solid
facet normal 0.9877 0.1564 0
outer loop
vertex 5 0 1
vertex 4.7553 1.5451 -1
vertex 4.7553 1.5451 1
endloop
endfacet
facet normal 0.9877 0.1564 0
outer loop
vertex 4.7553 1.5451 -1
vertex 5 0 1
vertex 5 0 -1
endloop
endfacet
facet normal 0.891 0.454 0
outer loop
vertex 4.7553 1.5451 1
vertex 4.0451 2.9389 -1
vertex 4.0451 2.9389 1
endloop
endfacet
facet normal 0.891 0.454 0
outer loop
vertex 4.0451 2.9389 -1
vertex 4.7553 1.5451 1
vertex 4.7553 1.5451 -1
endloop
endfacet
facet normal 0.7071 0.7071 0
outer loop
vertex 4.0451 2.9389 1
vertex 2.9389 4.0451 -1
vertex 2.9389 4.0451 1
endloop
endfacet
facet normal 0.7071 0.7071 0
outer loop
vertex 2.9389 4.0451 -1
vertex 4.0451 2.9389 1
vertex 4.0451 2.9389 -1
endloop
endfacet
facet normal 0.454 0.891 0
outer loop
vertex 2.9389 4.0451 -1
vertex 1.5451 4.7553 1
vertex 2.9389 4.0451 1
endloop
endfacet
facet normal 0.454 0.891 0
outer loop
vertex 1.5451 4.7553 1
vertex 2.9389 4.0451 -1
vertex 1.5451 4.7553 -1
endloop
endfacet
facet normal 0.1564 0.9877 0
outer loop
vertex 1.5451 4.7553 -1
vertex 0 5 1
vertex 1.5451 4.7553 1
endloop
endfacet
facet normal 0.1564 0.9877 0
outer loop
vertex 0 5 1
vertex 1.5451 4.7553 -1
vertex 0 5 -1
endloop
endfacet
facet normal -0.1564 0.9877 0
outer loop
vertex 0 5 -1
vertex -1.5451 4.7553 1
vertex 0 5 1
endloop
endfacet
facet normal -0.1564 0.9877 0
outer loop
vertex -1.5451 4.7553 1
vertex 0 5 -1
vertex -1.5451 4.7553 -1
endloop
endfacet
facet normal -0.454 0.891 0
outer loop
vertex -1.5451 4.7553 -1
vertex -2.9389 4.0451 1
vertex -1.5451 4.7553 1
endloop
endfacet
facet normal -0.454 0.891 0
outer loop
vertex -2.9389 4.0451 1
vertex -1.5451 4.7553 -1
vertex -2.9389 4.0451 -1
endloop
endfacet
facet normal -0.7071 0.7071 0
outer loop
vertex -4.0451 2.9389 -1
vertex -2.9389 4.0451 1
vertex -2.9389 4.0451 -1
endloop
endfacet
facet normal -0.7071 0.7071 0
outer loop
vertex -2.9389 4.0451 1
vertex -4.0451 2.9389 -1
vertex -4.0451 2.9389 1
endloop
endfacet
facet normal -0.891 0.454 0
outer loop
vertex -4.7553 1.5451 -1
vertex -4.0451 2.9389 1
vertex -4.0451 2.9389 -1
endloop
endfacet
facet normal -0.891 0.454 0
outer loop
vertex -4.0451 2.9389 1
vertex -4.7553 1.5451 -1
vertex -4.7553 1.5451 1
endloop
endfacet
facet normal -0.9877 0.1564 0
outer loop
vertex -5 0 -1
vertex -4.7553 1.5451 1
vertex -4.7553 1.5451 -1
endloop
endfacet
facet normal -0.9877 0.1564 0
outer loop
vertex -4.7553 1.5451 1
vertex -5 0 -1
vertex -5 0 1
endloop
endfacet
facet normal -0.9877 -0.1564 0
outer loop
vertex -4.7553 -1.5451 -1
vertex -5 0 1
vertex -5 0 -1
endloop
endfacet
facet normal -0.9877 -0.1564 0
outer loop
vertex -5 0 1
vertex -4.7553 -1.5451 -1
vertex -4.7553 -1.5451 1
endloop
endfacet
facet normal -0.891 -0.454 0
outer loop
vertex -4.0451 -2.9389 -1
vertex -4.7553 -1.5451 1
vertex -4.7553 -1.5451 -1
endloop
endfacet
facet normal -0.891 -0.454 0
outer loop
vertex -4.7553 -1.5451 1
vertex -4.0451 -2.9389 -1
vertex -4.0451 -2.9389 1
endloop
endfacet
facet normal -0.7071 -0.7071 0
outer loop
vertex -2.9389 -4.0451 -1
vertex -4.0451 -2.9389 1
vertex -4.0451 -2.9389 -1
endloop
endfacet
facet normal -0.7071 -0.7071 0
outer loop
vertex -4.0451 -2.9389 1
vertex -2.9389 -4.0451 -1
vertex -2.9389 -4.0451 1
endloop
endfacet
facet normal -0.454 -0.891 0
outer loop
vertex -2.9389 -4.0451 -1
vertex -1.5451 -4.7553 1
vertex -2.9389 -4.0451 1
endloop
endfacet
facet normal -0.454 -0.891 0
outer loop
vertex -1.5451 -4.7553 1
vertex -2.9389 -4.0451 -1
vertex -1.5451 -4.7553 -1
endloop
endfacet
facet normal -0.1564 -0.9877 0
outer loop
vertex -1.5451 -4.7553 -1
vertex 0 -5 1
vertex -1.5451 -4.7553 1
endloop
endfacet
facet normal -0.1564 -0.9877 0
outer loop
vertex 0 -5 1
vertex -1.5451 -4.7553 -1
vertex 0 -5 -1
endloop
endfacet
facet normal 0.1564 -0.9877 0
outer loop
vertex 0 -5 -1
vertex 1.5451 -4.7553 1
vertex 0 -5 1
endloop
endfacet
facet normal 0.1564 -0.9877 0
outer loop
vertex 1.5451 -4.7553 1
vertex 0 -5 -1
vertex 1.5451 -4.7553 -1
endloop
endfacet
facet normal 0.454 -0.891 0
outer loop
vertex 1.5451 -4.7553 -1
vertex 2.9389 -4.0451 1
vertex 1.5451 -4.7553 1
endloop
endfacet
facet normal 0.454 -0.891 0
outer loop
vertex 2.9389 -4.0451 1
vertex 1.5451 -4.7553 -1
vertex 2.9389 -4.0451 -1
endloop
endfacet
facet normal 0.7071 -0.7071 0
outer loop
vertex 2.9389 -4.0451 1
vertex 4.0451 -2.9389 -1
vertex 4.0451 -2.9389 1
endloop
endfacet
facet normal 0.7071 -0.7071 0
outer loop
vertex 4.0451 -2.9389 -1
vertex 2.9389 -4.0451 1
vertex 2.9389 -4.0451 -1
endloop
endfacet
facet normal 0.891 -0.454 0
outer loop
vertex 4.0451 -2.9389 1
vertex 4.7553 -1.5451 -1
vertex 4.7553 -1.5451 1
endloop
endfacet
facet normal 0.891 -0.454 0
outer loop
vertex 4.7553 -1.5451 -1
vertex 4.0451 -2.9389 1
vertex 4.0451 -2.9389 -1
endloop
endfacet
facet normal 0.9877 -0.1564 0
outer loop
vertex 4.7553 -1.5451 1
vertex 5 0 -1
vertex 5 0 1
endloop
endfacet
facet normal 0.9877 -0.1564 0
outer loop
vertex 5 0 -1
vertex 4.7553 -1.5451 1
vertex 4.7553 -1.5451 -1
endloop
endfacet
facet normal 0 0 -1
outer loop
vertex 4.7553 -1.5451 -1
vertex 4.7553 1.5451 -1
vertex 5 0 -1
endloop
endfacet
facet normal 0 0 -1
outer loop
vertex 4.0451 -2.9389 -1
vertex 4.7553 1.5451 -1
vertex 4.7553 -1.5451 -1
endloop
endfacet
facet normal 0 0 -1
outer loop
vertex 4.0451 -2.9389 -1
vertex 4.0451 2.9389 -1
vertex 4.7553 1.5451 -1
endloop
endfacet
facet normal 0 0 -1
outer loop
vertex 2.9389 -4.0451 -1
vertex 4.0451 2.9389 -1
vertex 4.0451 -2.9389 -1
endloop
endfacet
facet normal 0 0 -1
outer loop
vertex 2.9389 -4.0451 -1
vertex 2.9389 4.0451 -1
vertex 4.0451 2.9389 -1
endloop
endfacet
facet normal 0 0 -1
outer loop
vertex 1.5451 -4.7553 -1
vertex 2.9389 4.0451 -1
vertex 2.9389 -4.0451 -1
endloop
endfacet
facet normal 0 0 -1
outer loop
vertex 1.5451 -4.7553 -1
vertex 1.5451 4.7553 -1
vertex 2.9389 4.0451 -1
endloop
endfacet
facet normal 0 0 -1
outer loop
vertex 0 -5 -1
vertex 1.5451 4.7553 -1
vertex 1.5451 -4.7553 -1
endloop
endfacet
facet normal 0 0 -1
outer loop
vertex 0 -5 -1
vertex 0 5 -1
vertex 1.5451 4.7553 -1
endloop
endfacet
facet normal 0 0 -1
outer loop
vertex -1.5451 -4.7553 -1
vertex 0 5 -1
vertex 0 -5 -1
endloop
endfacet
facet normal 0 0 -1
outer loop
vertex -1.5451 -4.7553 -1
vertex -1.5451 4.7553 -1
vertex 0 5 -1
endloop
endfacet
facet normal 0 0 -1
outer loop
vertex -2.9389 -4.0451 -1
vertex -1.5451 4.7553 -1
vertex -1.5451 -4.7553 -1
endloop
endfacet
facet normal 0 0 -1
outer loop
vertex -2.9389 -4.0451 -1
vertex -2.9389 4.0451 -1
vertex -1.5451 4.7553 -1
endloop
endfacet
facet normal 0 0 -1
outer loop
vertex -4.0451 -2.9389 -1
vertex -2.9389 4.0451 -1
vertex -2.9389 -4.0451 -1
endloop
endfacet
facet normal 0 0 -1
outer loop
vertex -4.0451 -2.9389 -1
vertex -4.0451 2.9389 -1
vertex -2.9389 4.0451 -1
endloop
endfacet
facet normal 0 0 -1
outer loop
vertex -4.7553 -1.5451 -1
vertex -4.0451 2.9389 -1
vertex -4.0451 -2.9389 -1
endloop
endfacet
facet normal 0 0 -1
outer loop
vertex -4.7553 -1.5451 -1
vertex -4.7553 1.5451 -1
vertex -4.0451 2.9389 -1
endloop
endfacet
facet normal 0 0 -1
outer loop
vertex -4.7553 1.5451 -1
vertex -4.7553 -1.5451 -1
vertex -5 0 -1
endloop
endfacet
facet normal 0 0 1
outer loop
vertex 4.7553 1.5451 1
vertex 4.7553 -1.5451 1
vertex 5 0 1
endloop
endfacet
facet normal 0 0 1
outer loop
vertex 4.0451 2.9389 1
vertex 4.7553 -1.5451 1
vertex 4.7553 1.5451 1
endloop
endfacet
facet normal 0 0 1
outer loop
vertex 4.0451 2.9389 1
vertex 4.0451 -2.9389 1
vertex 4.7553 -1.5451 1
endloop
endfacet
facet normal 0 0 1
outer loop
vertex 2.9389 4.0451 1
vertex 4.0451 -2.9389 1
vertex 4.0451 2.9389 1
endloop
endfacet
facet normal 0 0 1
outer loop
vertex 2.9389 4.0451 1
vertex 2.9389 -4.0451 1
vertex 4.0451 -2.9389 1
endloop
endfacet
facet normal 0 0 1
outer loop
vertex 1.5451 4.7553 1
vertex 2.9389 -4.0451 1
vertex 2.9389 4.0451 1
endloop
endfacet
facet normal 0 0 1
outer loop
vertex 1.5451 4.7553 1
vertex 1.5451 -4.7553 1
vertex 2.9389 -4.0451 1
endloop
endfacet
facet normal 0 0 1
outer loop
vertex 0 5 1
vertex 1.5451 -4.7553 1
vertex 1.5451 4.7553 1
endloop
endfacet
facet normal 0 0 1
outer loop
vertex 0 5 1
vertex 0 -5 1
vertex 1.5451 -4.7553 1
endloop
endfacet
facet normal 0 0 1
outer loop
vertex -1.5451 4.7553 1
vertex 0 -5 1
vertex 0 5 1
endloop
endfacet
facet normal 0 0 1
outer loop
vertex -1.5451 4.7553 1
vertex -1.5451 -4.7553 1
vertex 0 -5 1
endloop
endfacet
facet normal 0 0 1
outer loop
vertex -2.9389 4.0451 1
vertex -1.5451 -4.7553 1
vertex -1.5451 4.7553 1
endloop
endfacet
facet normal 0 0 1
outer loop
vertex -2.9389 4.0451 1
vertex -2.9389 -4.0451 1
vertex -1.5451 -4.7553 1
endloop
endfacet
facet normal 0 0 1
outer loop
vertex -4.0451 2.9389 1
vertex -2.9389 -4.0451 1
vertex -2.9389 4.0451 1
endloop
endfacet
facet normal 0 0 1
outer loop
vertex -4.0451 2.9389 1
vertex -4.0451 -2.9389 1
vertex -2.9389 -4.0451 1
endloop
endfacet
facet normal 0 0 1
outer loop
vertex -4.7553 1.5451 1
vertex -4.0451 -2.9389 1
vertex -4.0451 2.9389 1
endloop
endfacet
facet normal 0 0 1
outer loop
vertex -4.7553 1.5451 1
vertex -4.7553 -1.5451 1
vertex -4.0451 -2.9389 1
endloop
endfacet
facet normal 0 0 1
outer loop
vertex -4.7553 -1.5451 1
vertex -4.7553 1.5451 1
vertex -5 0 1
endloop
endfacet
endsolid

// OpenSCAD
	

	radius = 5;
	numTeeth = 10;
	toothDepth = 1.5;
	height = 2;
	gearAngle = 0.6;

	depth = 3.141592 * radius / numTeeth;

	cylinder(h = height, r=radius, $fn=20, center=true);

	for(i= [0 : numTeeth]){
		
		rotate([0,0,(i/numTeeth)*360]){
			
			translate([radius - 0.1 ,0,0]){
		
				rotate([0,90,0]){
					gear(height, toothDepth, depth, gearAngle);
				}
			}
		}
	}

	

	module gear(width, depth, height, ratio){

		halfWidth = width / 2;
		haldDepth = depth / 2;
		//halfHeight = height / 2;
		

	/*
		0 = [-halfWidth, -haldDepth, 0];
		1 = [halfWidth, -haldDepth, 0];
		2 = [halfWidth, haldDepth, 0];
		3 = [-halfWidth, haldDepth, 0];

		4 = [-halfWidth*ratio, -haldDepth, height];
		5 = [halfWidth*ratio, -haldDepth, height];
		6 = [halfWidth*ratio, haldDepth, height];
		7 = [-halfWidth*ratio, haldDepth, height];
	*/
		


		polyhedron( 

			points = [[-halfWidth, -haldDepth, 0],[halfWidth, -haldDepth, 0],[halfWidth, haldDepth, 0],[-halfWidth, haldDepth, 0],[-halfWidth, -haldDepth*ratio, height],[halfWidth, -haldDepth*ratio, height],[halfWidth, haldDepth*ratio, height], [-halfWidth, haldDepth*ratio, height]], 

		triangles = [ 

			[0,1,3], [1,2,3], 		//bottom
	
			[0,1,4], [1,4,5] ,		// frount side

			[1,2,5], [2,5,6], 		// right side

			[2,3,6], [3,6,7], 		// back side

			[0,3,4], [3,4,7],		// left side

			[4,5,7], [5,6,7]		// top

		
		]

		);




	}
	
